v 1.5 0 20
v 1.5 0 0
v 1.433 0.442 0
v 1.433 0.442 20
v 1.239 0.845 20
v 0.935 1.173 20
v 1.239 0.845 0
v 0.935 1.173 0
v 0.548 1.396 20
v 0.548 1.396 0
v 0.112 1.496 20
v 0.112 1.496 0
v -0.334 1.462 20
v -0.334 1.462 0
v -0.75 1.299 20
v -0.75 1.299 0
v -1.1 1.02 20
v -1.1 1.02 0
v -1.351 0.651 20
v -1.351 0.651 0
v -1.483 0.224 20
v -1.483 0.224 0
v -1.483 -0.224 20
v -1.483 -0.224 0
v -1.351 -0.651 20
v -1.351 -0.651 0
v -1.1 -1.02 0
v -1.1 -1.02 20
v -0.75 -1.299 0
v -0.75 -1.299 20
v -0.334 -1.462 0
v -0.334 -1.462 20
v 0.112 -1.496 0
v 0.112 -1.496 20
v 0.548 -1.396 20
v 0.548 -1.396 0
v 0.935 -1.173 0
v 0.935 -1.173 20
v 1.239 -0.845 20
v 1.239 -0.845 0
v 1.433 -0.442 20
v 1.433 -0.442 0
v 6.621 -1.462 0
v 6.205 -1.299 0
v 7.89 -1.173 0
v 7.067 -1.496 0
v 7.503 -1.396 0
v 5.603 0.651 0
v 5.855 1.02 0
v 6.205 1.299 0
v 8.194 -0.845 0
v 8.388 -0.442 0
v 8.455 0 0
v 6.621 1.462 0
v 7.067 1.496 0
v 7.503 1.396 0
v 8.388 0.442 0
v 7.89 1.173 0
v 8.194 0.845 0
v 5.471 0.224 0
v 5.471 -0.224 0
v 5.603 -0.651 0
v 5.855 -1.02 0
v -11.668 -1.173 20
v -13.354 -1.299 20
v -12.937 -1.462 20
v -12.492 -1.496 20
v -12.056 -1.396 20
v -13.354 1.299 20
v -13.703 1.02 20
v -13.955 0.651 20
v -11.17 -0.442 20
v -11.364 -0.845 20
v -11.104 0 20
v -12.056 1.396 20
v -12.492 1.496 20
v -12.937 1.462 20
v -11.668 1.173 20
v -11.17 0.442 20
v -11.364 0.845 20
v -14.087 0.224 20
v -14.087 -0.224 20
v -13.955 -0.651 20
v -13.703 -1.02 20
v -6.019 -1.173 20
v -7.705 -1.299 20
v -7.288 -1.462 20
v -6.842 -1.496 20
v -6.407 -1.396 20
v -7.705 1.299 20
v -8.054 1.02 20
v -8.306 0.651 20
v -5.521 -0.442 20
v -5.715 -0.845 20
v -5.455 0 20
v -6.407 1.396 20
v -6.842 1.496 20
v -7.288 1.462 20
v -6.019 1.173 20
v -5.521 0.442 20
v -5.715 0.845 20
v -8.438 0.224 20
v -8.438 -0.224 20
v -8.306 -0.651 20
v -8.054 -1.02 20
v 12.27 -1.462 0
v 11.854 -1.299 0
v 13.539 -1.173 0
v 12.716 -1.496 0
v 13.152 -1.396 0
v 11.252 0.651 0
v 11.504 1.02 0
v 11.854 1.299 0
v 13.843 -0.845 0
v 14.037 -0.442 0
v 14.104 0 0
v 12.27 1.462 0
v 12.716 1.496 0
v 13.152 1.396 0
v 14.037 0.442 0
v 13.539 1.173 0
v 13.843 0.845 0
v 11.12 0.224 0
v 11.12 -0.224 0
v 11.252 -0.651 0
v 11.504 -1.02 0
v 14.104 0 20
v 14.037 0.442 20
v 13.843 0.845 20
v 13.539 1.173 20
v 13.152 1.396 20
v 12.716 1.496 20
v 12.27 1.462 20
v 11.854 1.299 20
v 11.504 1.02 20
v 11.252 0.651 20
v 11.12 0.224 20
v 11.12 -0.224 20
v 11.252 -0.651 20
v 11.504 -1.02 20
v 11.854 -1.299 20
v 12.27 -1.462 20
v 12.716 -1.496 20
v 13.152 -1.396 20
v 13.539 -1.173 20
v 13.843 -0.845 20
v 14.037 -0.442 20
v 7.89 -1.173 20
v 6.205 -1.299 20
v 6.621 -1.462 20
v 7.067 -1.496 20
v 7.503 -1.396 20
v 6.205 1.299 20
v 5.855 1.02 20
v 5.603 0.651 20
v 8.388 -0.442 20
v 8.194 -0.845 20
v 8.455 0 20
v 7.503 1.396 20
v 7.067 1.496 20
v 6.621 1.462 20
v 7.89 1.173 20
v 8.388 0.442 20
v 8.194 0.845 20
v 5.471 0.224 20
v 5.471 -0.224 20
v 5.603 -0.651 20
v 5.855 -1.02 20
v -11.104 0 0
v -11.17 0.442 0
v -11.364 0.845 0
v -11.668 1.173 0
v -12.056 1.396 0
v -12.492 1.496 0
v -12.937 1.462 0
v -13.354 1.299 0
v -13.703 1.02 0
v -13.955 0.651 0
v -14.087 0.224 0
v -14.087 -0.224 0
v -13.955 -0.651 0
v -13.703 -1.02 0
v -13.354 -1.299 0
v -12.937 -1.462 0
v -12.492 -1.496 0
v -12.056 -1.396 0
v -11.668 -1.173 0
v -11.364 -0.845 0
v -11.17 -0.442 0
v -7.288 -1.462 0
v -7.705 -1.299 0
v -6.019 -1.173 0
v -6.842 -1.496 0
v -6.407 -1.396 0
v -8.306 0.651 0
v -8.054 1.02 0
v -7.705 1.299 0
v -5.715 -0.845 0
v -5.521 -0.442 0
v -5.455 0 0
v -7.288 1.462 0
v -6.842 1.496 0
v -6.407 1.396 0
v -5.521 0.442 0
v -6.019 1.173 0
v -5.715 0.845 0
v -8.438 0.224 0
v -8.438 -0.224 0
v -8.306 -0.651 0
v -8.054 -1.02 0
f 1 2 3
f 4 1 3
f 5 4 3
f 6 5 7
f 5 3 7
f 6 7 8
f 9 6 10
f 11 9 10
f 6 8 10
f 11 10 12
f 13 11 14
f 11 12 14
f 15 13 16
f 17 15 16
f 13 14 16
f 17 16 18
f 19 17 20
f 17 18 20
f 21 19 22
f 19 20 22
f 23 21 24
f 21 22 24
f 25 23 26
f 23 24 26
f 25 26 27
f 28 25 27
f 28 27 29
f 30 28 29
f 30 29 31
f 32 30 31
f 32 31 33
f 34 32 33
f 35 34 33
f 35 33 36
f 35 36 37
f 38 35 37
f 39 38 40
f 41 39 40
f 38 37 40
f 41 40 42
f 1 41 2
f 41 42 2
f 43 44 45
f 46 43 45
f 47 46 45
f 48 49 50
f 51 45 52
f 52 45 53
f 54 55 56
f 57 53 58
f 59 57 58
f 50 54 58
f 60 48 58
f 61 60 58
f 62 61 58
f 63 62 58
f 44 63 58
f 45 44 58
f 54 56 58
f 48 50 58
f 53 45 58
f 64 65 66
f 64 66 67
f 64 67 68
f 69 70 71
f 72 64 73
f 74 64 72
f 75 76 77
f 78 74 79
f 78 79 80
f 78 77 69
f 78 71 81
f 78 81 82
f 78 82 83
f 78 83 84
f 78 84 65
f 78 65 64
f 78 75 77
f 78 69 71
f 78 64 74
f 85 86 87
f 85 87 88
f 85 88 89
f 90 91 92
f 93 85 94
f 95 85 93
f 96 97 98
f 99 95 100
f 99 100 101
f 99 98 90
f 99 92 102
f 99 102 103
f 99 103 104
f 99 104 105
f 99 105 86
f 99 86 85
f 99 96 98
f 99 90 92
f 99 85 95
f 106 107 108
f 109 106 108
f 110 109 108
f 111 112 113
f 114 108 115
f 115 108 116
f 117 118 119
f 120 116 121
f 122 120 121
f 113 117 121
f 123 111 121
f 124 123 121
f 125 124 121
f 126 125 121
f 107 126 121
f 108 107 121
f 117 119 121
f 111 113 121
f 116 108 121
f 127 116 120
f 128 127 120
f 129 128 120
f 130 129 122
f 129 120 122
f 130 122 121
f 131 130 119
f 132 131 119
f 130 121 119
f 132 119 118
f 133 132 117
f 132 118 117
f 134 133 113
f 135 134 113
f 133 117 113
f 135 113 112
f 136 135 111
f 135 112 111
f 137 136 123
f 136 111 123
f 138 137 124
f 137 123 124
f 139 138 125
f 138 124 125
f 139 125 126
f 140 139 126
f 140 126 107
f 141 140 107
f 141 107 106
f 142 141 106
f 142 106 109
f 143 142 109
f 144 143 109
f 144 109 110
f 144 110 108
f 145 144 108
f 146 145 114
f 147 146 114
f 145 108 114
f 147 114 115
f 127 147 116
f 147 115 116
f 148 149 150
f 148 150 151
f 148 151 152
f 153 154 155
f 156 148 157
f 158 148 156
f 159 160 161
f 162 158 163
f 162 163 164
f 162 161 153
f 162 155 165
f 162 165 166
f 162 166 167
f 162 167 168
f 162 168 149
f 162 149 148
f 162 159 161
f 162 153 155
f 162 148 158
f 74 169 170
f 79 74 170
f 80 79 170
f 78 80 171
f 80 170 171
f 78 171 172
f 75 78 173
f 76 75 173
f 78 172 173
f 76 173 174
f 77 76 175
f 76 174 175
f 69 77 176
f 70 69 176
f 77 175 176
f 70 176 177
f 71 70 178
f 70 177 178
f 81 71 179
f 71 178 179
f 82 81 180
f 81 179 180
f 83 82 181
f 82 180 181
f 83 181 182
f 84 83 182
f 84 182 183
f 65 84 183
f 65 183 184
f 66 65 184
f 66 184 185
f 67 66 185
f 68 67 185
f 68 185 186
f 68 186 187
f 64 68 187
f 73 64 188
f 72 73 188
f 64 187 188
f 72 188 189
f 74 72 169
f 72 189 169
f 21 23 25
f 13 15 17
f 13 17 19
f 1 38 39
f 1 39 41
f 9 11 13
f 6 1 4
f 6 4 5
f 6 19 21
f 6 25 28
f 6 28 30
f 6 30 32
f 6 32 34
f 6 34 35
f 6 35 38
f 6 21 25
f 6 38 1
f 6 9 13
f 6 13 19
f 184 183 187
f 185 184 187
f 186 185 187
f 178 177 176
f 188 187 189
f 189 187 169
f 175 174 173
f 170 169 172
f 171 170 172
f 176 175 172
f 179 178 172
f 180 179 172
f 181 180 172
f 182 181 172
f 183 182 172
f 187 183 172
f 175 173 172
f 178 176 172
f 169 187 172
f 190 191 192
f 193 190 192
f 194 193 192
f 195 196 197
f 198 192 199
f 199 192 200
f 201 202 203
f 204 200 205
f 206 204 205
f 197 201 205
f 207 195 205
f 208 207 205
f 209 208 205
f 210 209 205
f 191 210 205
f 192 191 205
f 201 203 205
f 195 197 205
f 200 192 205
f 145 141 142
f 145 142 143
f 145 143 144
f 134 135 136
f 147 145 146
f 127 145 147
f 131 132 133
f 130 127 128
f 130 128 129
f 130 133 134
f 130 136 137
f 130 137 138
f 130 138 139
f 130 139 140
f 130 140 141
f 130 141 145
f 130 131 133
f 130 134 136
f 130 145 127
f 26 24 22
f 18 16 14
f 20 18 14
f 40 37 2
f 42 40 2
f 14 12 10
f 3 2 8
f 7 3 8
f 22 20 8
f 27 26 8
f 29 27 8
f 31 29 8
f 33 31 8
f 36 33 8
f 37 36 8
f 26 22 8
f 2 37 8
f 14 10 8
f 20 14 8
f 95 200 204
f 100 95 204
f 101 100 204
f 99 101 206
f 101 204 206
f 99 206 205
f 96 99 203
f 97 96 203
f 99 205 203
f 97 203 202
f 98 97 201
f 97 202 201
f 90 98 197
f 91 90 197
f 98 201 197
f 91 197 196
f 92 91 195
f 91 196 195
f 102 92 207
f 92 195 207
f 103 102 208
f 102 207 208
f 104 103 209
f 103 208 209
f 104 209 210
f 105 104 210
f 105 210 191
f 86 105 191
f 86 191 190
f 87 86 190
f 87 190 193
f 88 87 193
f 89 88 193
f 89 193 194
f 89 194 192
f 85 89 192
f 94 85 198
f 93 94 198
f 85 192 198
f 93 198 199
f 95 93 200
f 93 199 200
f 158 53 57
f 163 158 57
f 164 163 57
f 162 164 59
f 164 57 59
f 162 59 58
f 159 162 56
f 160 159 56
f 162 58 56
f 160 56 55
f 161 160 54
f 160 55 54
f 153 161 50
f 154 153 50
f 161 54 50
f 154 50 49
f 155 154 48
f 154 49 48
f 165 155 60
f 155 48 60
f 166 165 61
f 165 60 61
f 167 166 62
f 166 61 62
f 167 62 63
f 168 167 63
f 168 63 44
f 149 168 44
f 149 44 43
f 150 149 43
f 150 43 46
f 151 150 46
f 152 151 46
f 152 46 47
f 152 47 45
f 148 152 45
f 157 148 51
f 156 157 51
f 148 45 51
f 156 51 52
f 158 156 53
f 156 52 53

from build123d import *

# Parameters (mm, degrees)
F0_R     = 1.5
F1_DEPTH = 20


with BuildPart() as f1:
    # F0 (on Top) → F1 (new body)
    with BuildSketch(Plane.XY):
        Circle(F0_R)
        with Locations((6.954546, 0)):
            Circle(F0_R)
        with Locations((12.603714, 0)):
            Circle(F0_R)
        with Locations((-6.954546, 0)):
            Circle(F0_R)
        with Locations((-12.603714, 0)):
            Circle(F0_R)
    extrude(amount=F1_DEPTH)


solid = f1.part
